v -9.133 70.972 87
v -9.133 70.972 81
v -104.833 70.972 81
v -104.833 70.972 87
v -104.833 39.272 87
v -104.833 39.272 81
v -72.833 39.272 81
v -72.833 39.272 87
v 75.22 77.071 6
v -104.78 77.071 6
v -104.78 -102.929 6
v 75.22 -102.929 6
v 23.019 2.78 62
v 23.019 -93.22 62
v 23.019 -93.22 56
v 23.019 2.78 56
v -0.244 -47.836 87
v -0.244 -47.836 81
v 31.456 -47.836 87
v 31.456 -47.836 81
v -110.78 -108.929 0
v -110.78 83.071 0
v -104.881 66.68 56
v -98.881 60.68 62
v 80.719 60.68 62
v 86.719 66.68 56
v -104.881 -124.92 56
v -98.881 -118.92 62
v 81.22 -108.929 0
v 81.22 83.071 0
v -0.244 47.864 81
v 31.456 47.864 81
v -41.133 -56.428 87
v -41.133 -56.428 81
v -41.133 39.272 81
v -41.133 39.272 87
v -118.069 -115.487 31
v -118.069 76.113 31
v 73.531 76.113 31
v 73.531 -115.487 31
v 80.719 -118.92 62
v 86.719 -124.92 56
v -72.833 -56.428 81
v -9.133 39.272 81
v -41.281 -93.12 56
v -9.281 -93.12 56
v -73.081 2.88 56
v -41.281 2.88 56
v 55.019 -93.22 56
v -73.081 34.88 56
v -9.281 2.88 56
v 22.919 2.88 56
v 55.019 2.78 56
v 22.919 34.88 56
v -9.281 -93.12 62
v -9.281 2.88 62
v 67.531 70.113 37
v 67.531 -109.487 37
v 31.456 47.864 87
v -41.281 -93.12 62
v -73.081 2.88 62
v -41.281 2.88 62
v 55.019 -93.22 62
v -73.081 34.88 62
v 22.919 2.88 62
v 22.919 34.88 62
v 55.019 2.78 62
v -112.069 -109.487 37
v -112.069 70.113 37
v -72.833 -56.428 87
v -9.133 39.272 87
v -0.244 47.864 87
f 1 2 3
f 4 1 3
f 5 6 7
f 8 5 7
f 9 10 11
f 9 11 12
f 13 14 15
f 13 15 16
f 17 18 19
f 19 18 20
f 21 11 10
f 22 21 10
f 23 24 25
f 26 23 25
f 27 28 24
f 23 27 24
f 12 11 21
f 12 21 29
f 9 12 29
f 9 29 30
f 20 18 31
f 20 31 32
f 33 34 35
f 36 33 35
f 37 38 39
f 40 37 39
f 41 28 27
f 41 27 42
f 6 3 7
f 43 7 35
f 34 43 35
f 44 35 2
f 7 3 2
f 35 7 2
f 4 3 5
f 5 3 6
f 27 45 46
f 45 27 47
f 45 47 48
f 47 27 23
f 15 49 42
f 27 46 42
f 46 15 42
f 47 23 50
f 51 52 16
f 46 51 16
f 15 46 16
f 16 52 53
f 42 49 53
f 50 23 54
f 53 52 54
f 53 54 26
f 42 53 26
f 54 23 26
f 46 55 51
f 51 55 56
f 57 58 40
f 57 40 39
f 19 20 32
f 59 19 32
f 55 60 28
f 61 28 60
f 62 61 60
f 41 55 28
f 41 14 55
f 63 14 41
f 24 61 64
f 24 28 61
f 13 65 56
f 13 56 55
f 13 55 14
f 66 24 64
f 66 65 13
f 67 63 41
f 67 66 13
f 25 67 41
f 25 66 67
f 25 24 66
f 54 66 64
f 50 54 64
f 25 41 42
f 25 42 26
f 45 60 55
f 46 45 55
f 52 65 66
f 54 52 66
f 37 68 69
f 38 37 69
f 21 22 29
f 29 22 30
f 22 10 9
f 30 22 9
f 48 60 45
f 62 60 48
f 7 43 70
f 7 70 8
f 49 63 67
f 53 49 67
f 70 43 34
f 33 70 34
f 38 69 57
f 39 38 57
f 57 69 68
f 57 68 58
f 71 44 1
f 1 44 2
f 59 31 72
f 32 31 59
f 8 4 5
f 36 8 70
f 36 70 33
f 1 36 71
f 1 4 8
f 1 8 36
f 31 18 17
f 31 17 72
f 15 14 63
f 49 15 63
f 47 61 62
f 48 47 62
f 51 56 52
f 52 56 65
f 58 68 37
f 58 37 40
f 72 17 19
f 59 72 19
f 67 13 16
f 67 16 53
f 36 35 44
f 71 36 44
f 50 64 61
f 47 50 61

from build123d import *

# Parameters (mm, degrees)
F0_W      = 192
F0_H      = 192
F1_DEPTH  = 6
F2_SIZE   = 5.99999
F4_W      = 191.6
F4_H      = 191.6
F5_DEPTH  = 6
F6_SIZE   = 5.99999
F8_W      = 191.6
F8_H      = 191.6
F9_DEPTH  = 6
F10_SIZE  = 5.99999
F11_W     = 32
F11_H     = 96
F12_DEPTH = 25
F13_W     = 32
F13_H     = 96
F14_DEPTH = 62.001
F16_W     = 31.7
F16_H     = 95.7
F17_DEPTH = 6


# Not quite as in the source:
# - a fillet or chamfer is up to 0.001 mm smaller than in the source, because OpenCascade refuses the exact size


with BuildPart() as f1:
    # F0 (on Top) → F1 (new body)
    with BuildSketch(Plane.XY):
        with Locations((-14.7799842507, -12.9291996509)):
            Rectangle(F0_W, F0_H)
    extrude(amount=F1_DEPTH)

    # F2 (size 6 in the source; OpenCascade refuses exactly that, so slightly less here)
    f2_edges = [f1.edges().sort_by_distance(p)[0] for p in [
        (-14.779984, 83.0708, 6),
        (-110.779984, -12.9292, 6),
        (-14.779984, -108.9292, 6),
        (81.220016, -12.9292, 6),
    ]]
    chamfer(f2_edges, length=F2_SIZE)


with BuildPart() as f5:
    # F4 (on offset) → F5 (new body)
    with BuildSketch(Plane.XY.offset(31)):
        with Locations((-22.2688633949, -19.6866440775)):
            Rectangle(F4_W, F4_H)
    extrude(amount=F5_DEPTH)

    # F6 (size 6 in the source; OpenCascade refuses exactly that, so slightly less here)
    f6_edges = [f5.edges().sort_by_distance(p)[0] for p in [
        (-22.268863, 76.113356, 37),
        (-118.068863, -19.686644, 37),
        (-22.268863, -115.486644, 37),
        (73.531137, -19.686644, 37),
    ]]
    chamfer(f6_edges, length=F6_SIZE)


with BuildPart() as f9:
    # F8 (on offset) → F9 (new body)
    with BuildSketch(Plane.XY.offset(56)):
        with Locations((-9.0808942914, -29.1196251102)):
            Rectangle(F8_W, F8_H)
    extrude(amount=F9_DEPTH)

    # F10 (size 6 in the source; OpenCascade refuses exactly that, so slightly less here)
    f10_edges = [f9.edges().sort_by_distance(p)[0] for p in [
        (86.719106, -29.119625, 62),
        (-9.080894, 66.680375, 62),
        (-104.880894, -29.119625, 62),
        (-9.080894, -124.919625, 62),
    ]]
    chamfer(f10_edges, length=F10_SIZE)

    # F11 (on face) → F12 (cut)
    with BuildSketch(Plane.XY.offset(62)):
        Polygon((22.9191057086, 34.8803748898), (-73.0808942914, 34.8803748898), (-73.0808942914, 2.8803748898), (-41.2808942914, 2.8803748898), (-9.2808942914, 2.8803748898), (22.9191057086, 2.8803748898), align=None)
        with Locations((-25.2808942914, -45.1196251102)):
            Rectangle(F11_W, F11_H)
    extrude(amount=-F12_DEPTH, mode=Mode.SUBTRACT)

    # F13 (on face) → F14 (cut, through all)
    with BuildSketch(Plane.XY.offset(62)):
        with Locations((39.0191057086, -45.2196251102)):
            Rectangle(F13_W, F13_H)
    extrude(amount=-F14_DEPTH, mode=Mode.SUBTRACT)


with BuildPart() as f17:
    # F16 (on offset) → F17 (new body)
    with BuildSketch(Plane.XY.offset(81)):
        Polygon((-9.1325868409, 70.9719068067), (-104.8325868409, 70.9719068067), (-104.8325868409, 39.2719068067), (-72.8325868409, 39.2719068067), (-41.1325868409, 39.2719068067), (-9.1325868409, 39.2719068067), align=None)
        with Locations((-56.9825868409, -8.5780931933)):
            Rectangle(F16_W, F16_H)
    extrude(amount=F17_DEPTH)


with BuildPart() as f17b:
    # F16 (on offset) → F17, piece 2 (new body)
    with BuildSketch(Plane.XY.offset(81)):
        with Locations((15.6059558275, 0.0141661112)):
            Rectangle(F16_W, F16_H)
    extrude(amount=F17_DEPTH)


solid = Compound([f1.part, f5.part, f9.part, f17.part, f17b.part])
